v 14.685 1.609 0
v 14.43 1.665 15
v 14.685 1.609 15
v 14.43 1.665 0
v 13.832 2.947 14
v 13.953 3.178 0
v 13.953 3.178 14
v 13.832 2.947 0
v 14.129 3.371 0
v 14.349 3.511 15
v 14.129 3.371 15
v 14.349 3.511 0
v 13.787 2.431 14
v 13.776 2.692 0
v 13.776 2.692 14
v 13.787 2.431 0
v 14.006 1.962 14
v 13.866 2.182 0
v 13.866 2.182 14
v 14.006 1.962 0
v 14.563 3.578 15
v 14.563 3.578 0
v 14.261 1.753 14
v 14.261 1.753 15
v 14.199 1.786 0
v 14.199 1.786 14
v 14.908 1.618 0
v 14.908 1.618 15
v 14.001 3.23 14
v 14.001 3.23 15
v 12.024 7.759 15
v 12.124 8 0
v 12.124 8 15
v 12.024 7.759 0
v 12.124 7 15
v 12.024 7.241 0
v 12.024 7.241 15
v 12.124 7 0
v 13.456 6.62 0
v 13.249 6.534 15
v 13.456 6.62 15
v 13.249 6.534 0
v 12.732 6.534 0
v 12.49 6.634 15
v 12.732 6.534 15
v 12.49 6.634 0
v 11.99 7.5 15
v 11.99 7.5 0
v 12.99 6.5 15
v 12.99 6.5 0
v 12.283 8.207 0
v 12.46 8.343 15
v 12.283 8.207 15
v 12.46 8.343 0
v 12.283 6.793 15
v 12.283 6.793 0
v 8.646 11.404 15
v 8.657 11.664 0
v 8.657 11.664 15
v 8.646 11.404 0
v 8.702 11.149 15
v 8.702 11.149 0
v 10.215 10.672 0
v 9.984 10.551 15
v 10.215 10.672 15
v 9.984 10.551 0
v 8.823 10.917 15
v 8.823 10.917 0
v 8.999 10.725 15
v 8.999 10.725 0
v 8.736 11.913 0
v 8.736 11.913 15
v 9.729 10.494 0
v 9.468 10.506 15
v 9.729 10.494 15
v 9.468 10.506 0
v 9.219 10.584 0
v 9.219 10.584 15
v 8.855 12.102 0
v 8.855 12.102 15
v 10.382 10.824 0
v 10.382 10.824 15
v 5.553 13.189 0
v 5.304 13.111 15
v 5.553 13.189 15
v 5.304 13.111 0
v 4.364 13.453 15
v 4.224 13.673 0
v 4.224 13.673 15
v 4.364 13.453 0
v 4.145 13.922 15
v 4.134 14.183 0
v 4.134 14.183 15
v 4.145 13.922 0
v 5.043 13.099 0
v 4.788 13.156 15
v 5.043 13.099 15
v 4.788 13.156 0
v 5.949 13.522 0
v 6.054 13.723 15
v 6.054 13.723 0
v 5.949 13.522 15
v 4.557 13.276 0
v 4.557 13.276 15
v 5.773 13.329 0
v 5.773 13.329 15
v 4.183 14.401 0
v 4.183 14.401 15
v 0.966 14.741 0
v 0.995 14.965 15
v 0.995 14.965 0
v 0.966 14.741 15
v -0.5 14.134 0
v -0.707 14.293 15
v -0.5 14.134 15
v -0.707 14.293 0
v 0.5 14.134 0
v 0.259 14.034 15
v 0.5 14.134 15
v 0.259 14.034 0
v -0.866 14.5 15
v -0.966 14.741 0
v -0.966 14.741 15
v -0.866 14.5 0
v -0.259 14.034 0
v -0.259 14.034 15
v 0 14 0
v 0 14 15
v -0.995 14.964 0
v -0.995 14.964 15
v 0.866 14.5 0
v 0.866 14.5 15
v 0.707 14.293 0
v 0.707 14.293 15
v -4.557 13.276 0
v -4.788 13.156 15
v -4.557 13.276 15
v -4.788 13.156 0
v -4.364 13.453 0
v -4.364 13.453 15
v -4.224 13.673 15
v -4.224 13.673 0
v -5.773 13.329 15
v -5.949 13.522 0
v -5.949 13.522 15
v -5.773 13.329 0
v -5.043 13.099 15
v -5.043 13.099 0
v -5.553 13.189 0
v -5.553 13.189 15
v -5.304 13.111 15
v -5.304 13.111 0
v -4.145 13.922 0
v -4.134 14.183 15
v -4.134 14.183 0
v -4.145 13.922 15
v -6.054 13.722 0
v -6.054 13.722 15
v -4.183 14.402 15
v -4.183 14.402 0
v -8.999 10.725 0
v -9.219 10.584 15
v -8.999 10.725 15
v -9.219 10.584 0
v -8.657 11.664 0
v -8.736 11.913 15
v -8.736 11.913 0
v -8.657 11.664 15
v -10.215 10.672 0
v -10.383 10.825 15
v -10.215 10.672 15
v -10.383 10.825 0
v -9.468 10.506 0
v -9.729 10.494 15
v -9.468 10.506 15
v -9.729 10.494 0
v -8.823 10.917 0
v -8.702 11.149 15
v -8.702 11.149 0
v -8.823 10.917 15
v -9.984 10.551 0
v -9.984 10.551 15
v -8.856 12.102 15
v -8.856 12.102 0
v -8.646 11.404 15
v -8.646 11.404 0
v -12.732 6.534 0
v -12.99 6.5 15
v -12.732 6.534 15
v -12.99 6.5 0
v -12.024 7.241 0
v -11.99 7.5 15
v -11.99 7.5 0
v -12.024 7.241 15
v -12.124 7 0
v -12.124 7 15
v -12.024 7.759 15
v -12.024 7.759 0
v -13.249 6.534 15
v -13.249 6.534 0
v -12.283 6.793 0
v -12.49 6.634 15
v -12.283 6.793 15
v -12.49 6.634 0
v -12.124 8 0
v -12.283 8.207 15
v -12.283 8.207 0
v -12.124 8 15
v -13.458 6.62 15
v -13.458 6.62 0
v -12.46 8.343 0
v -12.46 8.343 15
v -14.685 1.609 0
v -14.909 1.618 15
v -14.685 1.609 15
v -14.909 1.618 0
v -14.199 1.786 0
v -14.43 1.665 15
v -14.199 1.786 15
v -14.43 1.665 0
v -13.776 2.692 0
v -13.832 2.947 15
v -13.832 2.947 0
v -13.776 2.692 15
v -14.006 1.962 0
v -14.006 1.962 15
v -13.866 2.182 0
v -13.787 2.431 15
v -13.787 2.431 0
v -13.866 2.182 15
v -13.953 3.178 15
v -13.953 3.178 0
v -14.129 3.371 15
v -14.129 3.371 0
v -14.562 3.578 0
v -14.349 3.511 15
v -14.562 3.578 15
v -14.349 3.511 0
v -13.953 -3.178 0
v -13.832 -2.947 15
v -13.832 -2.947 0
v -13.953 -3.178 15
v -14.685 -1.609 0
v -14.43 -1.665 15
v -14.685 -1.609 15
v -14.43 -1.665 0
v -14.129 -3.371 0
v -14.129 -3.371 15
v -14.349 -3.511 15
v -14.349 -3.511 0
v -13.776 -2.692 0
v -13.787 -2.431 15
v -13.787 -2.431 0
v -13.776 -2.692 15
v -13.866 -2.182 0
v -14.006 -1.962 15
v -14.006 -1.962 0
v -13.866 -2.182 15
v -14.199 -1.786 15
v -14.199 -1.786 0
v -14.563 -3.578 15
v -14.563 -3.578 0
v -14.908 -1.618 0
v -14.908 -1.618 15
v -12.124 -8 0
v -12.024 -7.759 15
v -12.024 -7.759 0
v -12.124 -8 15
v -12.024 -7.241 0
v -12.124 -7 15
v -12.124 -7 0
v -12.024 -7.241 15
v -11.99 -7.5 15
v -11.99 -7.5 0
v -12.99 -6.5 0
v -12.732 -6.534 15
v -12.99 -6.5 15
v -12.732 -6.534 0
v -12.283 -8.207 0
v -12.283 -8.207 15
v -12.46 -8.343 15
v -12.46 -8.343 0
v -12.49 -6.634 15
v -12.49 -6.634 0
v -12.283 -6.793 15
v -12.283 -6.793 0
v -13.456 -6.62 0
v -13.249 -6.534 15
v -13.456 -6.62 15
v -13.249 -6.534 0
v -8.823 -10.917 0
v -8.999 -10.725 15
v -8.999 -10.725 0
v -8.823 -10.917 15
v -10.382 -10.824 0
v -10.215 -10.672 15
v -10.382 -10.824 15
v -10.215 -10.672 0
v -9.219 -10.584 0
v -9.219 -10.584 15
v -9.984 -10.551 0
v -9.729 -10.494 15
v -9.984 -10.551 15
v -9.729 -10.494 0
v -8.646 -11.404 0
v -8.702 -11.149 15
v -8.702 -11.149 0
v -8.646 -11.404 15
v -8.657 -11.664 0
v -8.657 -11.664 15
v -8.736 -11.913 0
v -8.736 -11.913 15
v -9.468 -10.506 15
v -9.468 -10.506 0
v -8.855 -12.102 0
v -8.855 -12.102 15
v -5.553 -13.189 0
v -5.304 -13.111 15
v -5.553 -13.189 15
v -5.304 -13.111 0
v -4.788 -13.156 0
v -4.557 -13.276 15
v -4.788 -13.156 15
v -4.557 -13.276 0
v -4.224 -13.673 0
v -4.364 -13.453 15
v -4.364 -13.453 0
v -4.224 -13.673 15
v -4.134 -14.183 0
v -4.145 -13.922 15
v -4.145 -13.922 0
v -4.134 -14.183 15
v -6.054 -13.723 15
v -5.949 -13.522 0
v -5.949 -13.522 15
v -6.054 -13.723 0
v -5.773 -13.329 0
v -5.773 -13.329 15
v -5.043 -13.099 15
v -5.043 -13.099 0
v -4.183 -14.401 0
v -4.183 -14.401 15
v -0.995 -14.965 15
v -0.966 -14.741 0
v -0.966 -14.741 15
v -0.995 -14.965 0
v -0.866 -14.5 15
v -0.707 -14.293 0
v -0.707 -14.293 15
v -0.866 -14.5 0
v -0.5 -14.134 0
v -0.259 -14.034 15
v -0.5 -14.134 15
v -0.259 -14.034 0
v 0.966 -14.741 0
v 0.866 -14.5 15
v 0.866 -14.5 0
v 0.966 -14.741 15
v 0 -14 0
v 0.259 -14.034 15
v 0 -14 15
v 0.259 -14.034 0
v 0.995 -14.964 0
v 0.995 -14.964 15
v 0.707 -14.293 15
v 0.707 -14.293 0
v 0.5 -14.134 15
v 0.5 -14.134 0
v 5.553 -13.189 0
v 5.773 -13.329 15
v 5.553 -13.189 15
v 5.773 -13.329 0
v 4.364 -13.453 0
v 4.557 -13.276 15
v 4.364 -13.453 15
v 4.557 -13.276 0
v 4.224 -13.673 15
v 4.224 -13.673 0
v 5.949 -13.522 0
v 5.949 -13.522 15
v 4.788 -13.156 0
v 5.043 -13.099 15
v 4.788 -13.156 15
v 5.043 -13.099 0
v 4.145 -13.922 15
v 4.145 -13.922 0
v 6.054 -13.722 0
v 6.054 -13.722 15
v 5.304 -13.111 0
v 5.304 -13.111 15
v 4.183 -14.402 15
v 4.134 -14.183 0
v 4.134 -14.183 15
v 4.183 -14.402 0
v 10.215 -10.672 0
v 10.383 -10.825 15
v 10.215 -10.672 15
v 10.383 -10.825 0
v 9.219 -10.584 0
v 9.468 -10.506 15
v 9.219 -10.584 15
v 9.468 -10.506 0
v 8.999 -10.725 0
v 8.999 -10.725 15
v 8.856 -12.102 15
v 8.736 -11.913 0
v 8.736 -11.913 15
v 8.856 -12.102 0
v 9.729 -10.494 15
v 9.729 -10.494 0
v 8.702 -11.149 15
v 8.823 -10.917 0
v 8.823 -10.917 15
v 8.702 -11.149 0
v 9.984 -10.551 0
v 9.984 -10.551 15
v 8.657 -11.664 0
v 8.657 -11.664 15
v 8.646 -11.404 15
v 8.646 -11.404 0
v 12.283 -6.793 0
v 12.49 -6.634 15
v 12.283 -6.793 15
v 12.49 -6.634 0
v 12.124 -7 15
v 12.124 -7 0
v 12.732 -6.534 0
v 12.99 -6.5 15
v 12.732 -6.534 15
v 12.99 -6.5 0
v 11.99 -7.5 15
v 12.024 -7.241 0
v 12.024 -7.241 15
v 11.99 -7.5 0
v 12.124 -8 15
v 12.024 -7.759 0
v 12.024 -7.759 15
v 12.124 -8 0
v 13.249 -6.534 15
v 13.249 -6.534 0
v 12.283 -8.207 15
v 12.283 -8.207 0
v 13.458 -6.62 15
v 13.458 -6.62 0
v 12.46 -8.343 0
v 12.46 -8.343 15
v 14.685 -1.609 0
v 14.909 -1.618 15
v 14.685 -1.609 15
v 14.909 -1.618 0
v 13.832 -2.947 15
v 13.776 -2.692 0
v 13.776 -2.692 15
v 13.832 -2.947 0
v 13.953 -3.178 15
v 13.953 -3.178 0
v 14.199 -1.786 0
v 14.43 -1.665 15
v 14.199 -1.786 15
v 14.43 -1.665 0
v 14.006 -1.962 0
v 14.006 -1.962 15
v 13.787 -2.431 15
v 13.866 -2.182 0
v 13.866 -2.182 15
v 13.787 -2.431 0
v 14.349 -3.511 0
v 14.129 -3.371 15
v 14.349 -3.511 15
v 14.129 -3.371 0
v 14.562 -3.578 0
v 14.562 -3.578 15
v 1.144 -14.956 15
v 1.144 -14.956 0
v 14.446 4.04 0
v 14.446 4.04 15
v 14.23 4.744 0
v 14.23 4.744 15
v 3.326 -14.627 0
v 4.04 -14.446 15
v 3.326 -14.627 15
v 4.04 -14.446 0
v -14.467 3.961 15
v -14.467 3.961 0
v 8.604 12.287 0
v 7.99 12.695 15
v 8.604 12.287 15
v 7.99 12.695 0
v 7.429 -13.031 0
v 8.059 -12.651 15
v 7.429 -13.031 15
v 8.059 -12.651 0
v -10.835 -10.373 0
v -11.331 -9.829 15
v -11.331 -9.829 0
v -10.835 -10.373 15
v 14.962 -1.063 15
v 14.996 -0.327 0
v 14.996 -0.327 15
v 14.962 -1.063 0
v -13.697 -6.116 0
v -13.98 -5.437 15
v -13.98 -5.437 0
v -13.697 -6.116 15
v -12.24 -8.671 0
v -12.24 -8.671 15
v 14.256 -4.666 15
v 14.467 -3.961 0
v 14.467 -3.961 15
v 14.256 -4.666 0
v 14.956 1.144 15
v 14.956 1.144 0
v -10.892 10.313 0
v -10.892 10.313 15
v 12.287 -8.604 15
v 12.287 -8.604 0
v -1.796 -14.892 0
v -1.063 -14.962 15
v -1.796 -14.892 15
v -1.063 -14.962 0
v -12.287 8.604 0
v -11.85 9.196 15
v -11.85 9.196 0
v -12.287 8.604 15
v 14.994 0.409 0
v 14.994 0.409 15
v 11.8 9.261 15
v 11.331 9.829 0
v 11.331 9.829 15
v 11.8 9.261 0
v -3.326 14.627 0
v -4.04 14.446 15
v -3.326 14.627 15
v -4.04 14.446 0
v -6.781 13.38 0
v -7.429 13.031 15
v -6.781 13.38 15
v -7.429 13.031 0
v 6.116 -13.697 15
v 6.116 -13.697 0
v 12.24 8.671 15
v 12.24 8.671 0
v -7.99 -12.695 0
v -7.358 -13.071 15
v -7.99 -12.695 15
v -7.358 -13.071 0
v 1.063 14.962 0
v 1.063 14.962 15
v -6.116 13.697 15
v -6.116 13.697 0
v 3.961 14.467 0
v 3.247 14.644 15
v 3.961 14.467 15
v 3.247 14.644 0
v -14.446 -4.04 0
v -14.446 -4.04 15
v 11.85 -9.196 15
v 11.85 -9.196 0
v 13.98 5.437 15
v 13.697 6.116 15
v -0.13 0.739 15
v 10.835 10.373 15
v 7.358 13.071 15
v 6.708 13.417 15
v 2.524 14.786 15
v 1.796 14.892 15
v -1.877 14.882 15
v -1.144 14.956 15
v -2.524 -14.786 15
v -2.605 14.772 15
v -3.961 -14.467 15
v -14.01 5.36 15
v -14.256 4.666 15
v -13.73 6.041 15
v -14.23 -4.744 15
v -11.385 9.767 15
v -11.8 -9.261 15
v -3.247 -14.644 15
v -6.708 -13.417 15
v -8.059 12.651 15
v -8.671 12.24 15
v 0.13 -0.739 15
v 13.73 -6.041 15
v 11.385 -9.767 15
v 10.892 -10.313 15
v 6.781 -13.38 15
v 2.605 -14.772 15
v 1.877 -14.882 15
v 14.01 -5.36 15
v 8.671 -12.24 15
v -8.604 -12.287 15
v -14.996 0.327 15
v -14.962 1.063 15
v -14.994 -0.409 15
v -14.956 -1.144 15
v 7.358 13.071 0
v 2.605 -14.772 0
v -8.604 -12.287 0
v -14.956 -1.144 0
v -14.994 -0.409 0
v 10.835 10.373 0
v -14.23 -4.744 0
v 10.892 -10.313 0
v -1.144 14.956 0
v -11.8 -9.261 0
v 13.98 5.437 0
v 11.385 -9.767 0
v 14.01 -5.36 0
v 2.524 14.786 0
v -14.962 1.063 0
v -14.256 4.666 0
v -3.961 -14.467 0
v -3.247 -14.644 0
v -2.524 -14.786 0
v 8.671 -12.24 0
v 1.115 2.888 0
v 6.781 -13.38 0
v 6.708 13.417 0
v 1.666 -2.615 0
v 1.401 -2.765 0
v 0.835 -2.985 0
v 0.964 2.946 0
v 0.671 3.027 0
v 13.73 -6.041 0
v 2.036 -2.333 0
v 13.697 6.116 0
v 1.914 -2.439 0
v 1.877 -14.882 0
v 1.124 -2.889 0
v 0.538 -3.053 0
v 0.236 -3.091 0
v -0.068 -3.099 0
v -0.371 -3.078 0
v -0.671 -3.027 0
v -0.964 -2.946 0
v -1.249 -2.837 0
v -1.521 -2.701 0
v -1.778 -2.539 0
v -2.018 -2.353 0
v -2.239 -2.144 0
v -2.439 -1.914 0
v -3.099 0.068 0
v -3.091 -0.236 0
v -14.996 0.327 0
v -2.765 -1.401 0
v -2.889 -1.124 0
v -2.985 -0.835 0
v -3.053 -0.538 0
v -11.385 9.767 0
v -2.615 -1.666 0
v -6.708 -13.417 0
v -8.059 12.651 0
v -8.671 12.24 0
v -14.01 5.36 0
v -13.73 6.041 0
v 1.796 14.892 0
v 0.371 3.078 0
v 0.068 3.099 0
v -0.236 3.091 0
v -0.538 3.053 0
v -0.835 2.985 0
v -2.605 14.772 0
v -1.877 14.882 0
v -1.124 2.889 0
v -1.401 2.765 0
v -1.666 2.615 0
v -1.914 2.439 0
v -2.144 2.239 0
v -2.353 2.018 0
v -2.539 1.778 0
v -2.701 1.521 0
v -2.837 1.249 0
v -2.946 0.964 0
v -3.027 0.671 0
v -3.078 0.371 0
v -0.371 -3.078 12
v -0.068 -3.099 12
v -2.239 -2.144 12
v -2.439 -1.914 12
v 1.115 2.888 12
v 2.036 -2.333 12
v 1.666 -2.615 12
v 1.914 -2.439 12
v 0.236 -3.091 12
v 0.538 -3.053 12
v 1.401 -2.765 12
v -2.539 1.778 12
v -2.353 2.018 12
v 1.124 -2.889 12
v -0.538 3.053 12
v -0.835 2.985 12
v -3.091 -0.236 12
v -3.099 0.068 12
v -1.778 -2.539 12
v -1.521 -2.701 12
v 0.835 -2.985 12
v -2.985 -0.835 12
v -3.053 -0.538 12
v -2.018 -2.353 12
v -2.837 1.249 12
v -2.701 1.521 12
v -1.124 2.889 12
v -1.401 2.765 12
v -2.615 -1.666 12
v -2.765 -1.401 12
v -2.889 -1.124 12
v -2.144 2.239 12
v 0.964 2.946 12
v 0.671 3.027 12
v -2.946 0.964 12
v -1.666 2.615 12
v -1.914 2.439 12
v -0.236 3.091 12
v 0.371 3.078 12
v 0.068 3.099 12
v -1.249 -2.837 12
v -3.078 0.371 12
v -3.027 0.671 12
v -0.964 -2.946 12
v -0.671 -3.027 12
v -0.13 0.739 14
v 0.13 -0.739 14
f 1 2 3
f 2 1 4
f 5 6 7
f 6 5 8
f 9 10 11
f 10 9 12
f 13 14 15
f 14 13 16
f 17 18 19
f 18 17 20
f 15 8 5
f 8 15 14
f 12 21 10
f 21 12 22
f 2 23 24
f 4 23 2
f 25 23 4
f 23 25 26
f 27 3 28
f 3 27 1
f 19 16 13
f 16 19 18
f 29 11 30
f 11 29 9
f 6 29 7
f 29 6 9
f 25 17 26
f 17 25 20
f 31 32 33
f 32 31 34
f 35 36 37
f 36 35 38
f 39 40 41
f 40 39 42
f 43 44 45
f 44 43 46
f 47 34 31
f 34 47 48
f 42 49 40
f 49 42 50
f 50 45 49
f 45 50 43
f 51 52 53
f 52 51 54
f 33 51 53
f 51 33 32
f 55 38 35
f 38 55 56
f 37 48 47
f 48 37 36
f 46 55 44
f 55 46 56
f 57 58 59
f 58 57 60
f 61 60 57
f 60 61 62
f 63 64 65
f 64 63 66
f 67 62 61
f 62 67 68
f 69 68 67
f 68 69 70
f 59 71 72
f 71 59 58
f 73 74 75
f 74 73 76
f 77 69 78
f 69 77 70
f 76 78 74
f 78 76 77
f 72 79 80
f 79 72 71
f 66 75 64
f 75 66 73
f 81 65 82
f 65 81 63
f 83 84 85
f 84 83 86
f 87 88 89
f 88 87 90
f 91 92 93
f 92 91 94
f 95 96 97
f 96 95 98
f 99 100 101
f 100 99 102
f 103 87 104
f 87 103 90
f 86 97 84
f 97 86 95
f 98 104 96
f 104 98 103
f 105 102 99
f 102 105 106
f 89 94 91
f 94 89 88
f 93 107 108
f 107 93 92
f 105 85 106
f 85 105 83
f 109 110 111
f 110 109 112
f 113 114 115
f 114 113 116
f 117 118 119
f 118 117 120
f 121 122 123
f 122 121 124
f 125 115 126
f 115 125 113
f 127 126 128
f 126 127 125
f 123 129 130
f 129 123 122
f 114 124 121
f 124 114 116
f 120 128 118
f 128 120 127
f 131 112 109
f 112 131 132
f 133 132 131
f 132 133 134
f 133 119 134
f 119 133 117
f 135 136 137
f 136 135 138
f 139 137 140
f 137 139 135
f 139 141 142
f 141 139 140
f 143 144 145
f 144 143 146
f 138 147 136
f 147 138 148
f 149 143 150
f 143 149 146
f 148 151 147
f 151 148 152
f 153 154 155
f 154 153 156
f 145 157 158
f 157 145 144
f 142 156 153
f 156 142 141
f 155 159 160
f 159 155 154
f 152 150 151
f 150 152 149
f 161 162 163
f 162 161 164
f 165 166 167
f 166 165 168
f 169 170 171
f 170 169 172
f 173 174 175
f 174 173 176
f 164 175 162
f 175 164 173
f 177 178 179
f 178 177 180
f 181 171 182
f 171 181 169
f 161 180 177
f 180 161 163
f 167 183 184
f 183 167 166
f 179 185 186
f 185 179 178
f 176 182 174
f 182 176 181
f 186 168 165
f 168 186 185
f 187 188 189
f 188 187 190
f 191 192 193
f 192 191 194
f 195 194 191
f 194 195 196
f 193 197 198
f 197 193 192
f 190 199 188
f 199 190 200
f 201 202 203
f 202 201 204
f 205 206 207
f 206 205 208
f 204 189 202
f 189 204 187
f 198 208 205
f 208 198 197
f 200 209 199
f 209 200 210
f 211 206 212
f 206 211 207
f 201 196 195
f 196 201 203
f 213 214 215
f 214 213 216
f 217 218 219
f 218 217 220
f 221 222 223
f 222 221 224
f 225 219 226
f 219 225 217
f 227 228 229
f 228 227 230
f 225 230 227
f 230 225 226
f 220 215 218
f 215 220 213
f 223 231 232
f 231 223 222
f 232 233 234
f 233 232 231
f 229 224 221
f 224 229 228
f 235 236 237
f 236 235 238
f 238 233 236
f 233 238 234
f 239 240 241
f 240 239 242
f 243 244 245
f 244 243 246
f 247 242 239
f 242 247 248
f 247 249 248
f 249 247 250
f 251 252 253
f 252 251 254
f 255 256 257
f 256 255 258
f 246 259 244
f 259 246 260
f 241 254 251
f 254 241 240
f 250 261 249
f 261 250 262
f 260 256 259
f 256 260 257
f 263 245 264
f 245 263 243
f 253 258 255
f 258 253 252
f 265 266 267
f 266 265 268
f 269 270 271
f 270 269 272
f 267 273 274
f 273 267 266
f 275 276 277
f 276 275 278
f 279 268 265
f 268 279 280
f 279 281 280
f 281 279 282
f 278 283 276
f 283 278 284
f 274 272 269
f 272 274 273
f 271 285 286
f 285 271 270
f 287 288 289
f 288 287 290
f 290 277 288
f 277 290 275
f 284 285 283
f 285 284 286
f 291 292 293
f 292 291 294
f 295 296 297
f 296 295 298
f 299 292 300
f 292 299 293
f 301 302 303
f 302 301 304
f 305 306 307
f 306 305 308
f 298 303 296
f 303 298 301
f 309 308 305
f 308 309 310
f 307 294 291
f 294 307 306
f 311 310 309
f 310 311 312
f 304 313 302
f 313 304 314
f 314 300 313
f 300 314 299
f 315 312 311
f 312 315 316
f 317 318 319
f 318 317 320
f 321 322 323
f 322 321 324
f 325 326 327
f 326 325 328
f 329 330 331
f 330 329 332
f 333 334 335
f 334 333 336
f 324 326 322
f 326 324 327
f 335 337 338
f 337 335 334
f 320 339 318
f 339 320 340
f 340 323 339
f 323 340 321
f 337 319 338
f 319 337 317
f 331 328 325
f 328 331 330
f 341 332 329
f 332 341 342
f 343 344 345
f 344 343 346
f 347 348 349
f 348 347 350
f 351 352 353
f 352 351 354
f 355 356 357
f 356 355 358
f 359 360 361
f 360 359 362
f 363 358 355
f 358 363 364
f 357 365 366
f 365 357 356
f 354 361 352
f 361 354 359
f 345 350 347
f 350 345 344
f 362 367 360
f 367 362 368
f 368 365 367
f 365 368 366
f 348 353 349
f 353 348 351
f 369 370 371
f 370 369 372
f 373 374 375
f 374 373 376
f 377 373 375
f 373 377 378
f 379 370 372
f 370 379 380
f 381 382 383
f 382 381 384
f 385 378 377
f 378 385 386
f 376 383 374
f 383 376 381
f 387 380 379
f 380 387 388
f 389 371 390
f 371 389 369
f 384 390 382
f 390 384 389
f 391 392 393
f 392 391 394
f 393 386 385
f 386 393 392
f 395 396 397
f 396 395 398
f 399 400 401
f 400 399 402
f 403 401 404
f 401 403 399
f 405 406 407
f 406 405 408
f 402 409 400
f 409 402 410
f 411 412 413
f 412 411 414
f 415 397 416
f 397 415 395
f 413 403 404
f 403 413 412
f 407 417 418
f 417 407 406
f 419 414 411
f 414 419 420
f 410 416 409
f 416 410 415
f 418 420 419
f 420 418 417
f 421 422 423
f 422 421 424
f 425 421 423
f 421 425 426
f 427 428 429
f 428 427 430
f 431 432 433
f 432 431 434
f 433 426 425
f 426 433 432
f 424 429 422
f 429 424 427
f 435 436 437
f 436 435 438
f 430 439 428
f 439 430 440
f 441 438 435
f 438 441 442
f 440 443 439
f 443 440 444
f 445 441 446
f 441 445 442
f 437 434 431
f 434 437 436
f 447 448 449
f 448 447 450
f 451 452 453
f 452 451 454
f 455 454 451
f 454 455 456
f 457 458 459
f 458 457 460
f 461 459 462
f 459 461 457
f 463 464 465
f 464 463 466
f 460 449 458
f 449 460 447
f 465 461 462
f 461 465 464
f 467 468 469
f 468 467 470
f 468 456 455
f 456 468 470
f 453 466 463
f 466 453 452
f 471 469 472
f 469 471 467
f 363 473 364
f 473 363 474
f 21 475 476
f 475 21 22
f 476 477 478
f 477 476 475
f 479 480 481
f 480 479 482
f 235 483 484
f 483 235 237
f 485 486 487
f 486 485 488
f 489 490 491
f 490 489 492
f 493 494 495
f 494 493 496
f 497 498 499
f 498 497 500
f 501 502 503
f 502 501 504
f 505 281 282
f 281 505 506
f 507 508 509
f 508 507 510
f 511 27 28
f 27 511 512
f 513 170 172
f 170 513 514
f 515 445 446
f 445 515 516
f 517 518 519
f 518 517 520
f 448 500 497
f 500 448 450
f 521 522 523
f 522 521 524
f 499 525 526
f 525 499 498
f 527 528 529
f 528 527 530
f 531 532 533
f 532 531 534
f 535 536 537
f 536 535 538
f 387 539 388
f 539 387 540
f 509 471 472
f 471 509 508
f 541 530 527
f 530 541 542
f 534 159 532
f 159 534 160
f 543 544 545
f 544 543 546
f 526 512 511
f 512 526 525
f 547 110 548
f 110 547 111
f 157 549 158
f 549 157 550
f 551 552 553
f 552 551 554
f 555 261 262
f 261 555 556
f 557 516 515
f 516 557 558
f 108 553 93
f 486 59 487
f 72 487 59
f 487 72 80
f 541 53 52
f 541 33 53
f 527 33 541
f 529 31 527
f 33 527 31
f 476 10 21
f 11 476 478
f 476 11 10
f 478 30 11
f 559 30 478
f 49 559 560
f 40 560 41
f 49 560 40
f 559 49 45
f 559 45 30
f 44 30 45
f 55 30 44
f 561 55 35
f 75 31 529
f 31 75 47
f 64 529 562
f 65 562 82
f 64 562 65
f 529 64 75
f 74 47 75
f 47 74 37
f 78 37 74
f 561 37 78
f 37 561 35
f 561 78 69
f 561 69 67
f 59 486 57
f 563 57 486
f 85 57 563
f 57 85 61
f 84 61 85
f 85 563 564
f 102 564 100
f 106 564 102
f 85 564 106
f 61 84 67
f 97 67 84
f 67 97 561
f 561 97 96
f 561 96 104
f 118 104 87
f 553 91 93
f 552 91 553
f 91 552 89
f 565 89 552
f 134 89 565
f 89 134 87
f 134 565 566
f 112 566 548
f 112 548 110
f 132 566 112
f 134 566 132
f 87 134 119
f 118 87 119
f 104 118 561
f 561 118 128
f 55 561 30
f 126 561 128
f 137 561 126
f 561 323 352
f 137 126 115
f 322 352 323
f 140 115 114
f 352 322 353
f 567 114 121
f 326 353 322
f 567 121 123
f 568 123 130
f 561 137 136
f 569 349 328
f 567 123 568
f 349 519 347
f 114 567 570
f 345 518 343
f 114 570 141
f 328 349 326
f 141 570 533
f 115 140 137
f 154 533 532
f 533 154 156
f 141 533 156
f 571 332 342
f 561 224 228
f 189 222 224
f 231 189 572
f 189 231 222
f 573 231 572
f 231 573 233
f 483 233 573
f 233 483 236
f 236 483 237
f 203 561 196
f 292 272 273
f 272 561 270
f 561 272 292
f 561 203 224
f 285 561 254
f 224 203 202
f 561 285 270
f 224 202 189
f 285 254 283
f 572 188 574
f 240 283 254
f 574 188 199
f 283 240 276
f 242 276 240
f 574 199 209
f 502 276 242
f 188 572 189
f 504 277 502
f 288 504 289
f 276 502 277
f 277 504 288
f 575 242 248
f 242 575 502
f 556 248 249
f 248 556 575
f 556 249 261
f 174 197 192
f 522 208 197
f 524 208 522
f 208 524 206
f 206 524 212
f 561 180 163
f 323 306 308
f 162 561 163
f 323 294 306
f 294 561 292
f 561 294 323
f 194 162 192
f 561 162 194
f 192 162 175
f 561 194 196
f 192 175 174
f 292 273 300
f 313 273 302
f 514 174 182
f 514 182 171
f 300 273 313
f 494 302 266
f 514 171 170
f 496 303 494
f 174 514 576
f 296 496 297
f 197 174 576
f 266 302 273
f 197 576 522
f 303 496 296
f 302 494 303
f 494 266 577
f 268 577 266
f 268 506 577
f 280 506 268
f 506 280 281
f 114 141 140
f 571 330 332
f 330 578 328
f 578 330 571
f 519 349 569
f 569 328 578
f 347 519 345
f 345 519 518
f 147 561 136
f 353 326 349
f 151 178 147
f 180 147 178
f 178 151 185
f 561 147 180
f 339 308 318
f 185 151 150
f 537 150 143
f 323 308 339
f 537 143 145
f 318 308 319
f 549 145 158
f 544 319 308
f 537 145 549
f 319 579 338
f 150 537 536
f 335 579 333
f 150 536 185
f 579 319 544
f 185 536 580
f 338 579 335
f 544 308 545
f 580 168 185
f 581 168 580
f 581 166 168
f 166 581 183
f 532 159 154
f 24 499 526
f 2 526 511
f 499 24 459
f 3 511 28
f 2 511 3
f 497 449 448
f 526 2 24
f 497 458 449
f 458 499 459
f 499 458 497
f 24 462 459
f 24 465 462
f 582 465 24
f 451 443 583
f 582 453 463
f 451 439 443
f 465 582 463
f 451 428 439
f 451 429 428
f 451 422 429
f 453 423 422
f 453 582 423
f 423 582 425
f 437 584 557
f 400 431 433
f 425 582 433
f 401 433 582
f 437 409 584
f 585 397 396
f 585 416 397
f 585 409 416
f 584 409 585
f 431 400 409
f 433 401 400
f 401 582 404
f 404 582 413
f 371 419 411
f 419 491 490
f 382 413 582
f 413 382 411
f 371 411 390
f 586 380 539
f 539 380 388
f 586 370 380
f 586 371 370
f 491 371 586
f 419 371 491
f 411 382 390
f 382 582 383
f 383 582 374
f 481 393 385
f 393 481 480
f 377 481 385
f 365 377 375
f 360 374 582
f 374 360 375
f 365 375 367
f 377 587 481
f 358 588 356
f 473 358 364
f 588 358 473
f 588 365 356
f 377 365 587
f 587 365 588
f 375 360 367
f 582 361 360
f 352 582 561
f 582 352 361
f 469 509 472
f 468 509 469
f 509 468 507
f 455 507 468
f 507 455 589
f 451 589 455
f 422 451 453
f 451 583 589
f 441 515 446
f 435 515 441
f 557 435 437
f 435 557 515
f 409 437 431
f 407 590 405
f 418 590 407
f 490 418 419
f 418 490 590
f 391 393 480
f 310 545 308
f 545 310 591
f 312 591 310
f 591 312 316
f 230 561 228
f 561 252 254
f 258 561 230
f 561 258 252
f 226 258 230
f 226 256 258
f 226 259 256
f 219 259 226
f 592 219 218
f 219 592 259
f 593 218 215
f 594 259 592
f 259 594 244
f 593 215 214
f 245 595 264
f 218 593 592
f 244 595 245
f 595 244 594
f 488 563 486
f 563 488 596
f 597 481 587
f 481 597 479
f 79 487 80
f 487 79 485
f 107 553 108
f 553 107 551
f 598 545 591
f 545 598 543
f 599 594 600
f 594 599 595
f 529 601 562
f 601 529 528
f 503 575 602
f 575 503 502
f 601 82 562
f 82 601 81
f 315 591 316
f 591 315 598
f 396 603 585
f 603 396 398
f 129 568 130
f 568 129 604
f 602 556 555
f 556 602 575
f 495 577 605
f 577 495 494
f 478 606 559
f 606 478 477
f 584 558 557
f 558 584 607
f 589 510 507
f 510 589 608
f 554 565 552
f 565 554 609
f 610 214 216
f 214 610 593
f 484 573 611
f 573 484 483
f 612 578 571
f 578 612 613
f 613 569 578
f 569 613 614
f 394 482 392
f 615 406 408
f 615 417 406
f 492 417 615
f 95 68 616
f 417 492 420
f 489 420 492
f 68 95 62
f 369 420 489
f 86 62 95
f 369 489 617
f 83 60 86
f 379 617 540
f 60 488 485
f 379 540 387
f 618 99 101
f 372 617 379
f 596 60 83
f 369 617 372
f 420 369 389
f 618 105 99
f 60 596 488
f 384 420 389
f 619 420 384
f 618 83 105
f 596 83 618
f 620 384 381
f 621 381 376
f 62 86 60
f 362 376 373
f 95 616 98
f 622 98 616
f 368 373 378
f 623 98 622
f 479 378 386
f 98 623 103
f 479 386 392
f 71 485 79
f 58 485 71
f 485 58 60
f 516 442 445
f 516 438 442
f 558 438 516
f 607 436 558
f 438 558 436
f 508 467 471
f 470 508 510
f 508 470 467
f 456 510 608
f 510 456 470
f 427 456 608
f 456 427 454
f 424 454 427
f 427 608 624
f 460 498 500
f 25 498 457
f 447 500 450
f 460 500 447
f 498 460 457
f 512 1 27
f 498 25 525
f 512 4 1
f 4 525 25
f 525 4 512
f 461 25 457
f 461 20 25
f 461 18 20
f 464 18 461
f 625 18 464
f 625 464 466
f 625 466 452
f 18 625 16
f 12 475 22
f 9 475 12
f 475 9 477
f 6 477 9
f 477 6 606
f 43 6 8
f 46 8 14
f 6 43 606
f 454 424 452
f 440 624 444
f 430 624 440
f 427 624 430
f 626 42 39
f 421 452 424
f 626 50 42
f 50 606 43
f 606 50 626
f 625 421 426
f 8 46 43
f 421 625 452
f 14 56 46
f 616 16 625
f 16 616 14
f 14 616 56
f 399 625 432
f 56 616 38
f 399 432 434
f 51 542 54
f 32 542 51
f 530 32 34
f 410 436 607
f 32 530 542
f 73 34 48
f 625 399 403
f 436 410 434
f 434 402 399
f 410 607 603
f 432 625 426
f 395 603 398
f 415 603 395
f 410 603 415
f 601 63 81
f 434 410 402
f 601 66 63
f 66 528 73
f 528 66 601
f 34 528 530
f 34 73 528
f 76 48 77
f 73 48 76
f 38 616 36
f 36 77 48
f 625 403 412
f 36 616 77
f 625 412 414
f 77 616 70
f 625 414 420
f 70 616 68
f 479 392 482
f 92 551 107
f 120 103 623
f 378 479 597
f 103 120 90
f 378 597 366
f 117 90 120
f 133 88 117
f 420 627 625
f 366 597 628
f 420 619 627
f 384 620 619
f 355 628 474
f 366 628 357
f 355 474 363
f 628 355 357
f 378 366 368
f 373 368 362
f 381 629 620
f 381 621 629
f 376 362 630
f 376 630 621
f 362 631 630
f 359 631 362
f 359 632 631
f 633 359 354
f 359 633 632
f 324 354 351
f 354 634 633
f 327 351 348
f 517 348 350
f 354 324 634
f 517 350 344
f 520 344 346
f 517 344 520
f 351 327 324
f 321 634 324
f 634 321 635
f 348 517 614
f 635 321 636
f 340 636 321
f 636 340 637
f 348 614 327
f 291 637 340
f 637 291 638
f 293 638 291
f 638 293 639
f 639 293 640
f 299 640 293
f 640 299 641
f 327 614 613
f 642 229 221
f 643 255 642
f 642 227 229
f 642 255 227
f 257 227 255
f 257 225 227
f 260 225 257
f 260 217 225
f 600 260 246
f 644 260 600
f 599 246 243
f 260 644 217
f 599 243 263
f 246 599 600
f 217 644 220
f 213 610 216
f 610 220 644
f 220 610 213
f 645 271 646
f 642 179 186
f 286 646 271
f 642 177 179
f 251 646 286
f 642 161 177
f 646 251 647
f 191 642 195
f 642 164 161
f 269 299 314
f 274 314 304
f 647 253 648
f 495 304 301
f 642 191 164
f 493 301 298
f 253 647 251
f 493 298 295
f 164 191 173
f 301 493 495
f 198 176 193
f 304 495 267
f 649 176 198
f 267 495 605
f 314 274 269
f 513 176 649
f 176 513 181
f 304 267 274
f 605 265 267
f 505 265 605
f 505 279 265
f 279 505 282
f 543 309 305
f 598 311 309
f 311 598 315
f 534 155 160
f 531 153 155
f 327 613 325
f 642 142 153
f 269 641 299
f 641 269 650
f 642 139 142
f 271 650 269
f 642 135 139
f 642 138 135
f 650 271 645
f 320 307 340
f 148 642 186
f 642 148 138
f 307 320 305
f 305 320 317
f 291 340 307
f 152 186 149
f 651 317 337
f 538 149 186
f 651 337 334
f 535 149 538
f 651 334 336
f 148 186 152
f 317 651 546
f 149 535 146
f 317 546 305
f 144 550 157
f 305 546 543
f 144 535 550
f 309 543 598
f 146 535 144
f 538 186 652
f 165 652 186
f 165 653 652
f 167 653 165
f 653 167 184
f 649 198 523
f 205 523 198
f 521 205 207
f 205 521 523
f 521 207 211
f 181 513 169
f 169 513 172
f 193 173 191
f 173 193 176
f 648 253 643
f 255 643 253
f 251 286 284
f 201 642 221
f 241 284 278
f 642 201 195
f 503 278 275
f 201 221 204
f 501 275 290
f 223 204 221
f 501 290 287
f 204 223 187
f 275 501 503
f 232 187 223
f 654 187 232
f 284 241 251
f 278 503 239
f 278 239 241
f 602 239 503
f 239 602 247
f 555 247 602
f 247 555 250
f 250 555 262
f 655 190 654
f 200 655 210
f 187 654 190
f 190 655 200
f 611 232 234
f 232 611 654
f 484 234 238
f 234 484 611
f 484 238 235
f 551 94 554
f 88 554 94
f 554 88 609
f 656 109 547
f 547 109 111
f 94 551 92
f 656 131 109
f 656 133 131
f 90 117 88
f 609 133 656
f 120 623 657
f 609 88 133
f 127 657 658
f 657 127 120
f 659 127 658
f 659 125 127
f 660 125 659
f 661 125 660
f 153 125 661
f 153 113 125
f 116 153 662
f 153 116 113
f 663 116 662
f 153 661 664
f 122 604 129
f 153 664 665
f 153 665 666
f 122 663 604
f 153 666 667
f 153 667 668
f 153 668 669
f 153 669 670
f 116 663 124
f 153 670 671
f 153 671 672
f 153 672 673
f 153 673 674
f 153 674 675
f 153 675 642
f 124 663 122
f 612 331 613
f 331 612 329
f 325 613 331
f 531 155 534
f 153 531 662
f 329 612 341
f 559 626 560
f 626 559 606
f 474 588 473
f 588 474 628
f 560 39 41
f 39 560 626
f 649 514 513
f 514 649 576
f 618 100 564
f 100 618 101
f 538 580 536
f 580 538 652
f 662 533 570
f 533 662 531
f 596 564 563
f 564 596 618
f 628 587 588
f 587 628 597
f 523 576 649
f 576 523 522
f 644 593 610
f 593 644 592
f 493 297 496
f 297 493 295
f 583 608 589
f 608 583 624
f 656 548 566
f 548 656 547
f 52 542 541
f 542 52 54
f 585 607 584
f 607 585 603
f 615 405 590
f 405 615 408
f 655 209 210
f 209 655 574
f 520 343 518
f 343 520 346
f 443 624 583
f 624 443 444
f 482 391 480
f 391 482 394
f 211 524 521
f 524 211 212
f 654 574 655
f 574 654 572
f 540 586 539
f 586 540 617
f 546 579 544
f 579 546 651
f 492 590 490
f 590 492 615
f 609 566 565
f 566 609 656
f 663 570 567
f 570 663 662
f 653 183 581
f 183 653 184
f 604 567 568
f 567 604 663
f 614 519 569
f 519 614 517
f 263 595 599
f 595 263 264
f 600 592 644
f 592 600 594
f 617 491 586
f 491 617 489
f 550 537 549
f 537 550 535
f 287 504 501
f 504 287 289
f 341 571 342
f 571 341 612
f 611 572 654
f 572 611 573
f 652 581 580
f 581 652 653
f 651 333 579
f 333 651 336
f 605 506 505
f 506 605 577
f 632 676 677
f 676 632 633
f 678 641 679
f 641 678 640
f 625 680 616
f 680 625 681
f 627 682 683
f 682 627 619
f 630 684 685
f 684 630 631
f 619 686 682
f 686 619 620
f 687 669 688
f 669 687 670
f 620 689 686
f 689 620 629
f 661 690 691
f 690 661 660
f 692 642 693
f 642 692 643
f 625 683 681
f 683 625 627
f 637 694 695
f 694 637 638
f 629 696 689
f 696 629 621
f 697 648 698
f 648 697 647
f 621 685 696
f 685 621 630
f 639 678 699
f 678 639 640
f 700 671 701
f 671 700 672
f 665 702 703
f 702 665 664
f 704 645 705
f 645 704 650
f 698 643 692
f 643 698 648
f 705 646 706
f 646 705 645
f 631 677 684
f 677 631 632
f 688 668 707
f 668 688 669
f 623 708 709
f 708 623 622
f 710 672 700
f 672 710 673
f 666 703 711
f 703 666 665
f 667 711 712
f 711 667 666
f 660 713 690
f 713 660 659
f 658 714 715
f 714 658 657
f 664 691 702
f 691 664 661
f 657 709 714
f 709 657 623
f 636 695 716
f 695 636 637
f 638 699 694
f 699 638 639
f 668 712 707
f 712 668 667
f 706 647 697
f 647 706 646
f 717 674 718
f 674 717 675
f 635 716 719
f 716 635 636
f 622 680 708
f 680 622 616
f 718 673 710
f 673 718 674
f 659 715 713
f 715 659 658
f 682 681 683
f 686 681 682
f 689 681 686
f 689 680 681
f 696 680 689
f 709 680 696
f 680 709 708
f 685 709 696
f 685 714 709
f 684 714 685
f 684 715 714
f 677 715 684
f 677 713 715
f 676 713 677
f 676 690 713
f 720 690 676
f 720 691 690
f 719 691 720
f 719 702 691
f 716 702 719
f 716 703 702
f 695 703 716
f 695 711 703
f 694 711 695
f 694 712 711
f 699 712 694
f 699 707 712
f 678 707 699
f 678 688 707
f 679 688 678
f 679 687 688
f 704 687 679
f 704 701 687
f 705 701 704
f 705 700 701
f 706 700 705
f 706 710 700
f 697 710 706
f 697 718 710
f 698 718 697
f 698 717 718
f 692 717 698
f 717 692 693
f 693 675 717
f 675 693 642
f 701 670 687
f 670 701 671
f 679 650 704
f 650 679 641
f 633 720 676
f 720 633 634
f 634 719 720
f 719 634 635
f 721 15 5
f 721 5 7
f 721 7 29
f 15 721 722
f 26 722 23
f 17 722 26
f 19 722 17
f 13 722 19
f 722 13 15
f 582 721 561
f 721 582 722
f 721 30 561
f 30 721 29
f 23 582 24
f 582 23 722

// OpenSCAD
// Replacement knob for a 6 mm D-shaft (hotplates, stirrers, power supplies)
// Category: quick fixes. D-shaped blind bore from the bottom, grip grooves and a
// pointer groove on top that lines up with the flat of the shaft.
// Print: PETG (heat near hotplates), 0.15 mm layers, 4 perimeters, bore face down.
// SPDX-License-Identifier: CERN-OHL-P-2.0

/* [Knob] */
knob_d = 30;
knob_h = 15;
shaft_d = 6.2;         // 6 mm shaft + 0.2 mm clearance
shaft_flat = 4.7;      // flat-to-round distance (4.5 mm nominal + clearance)
bore_depth = 12;
n_grooves = 18;
groove_d = 2;
pointer_w = 1.5;
pointer_depth = 1;

/* [Hidden] */
eps = 0.01;

rotate([0,0,10]) difference() {
    cylinder(d = knob_d, h = knob_h, $fn = 128);
    // D-shaped bore; the flat faces +X
    translate([0, 0, -eps])
        linear_extrude(bore_depth + eps)
            intersection() {
                circle(d = shaft_d, $fn = 64);
                translate([-shaft_d / 2, -shaft_d / 2]) square([shaft_flat, shaft_d]);
            }
    // grip grooves
    for (i = [0 : n_grooves - 1])
        rotate(i * 360 / n_grooves)
            translate([knob_d / 2, 0, -eps]) cylinder(d = groove_d, h = knob_h + 2 * eps, $fn = 24);
    // pointer groove on top, pointing at the flat (+X)
    translate([0, -pointer_w / 2, knob_h - pointer_depth])
        cube([knob_d / 2 + 1, pointer_w, pointer_depth + eps]);
}
